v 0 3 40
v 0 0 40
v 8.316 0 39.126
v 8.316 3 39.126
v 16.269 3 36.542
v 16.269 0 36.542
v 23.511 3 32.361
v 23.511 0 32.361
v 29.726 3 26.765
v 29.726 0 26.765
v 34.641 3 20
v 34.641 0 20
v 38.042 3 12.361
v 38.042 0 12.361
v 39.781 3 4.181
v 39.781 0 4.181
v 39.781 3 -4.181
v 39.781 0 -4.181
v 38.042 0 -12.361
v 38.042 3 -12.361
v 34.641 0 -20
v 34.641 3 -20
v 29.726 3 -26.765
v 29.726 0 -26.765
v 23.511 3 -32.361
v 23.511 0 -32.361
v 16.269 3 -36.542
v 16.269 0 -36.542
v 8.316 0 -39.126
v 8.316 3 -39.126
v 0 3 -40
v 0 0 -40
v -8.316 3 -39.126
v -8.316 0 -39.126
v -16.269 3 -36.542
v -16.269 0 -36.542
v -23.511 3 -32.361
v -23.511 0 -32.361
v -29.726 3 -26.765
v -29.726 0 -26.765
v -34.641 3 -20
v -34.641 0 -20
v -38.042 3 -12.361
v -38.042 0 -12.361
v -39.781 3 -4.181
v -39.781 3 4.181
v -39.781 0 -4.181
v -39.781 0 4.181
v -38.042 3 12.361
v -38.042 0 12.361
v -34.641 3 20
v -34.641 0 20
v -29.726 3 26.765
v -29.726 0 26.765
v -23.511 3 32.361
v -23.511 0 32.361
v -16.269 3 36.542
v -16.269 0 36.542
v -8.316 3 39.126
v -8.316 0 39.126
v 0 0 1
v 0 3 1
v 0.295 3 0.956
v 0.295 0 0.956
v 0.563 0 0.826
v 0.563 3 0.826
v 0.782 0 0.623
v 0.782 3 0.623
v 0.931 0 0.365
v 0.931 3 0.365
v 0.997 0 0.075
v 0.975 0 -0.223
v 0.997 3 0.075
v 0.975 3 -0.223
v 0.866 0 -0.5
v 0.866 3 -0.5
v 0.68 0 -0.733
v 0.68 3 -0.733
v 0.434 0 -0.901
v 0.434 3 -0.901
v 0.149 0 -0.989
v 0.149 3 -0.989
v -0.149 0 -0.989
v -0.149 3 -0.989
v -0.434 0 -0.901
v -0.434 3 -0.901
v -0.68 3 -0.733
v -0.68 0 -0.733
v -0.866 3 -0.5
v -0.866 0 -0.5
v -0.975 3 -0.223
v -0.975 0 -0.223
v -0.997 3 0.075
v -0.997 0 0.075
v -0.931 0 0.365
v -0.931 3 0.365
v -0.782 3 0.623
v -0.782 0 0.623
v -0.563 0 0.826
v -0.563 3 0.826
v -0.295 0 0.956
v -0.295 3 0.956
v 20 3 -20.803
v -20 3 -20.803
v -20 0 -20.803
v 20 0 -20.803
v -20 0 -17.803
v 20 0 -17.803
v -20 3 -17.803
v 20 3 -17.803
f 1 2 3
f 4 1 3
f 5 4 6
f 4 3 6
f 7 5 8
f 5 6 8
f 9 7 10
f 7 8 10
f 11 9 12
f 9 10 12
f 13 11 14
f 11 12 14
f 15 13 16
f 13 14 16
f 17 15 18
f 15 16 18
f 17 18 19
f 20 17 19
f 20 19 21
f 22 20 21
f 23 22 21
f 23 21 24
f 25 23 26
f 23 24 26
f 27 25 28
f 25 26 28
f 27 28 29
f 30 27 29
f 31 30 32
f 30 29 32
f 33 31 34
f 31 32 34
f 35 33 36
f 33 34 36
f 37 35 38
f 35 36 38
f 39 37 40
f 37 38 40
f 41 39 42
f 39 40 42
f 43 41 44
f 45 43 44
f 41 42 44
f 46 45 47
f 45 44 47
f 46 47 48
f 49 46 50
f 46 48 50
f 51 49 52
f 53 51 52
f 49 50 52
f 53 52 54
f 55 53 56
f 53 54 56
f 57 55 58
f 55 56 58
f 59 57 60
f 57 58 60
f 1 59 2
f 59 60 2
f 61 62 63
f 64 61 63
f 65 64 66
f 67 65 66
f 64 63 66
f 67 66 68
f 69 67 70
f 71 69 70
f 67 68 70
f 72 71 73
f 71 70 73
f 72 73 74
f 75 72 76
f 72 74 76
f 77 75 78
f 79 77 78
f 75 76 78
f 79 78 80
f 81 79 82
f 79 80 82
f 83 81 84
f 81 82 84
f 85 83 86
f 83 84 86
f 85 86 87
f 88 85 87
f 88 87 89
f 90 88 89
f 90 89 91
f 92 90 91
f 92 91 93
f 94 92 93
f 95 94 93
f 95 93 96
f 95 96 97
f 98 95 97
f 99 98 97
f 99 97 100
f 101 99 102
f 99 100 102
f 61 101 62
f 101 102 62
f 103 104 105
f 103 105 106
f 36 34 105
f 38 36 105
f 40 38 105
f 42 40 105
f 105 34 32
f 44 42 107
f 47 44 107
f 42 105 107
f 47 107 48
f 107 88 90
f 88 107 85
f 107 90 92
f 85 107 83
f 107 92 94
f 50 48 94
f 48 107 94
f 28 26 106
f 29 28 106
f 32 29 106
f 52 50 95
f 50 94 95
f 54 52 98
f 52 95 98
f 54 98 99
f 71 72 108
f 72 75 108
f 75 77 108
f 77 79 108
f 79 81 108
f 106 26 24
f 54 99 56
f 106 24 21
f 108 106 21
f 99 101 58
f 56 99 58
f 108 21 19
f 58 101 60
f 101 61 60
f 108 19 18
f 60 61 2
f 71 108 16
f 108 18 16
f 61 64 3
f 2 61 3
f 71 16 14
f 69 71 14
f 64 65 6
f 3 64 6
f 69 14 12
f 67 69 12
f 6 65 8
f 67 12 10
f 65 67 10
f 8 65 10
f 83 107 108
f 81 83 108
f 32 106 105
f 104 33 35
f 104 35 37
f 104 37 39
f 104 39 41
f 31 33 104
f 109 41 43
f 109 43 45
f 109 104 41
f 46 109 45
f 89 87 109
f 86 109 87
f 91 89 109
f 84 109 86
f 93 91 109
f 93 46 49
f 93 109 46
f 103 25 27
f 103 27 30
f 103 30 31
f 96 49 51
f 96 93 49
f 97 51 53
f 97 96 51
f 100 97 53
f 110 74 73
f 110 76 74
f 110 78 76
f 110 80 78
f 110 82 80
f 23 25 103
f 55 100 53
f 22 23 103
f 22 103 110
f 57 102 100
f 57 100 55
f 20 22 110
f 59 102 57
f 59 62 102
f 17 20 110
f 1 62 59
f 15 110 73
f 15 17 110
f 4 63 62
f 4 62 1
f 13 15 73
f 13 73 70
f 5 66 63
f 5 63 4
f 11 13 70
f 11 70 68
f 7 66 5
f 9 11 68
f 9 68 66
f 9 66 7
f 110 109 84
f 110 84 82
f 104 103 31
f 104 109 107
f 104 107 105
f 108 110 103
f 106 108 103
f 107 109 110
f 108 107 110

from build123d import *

# Parameters (mm, degrees)
SKETCH1_R           = 40
BOSS_EXTRUDE1_DEPTH = 3
SKETCH2_R           = 1
CUT_EXTRUDE1_DEPTH  = 3
SKETCH3_W           = 40
SKETCH3_H           = 3
CUT_EXTRUDE2_DEPTH  = 10


with BuildPart() as part:
    # Sketch1 → Boss-Extrude1 (new body)
    with BuildSketch(Plane(origin=(0, 0, 0), x_dir=(1, 0, 0), z_dir=(0, 1, 0))):
        with Locations(Location((0, 0, 0), (0, 0, 270))):
            Circle(SKETCH1_R)
    extrude(amount=BOSS_EXTRUDE1_DEPTH)

    # Sketch2 → Cut-Extrude1 (cut)
    with BuildSketch(Plane(origin=(0, 3, 0), x_dir=(1, 0, 0), z_dir=(0, 1, 0))):
        with Locations(Location((0, 0, 0), (0, 0, 270))):
            Circle(SKETCH2_R)
    extrude(amount=-CUT_EXTRUDE1_DEPTH, mode=Mode.SUBTRACT)

    # Sketch3 → Cut-Extrude2 (cut)
    with BuildSketch(Plane(origin=(0, 3, 0), x_dir=(1, 0, 0), z_dir=(0, 1, 0))):
        with Locations((0, 19.302837328)):
            Rectangle(SKETCH3_W, SKETCH3_H)
    extrude(amount=-CUT_EXTRUDE2_DEPTH, mode=Mode.SUBTRACT)


solid = part.part
